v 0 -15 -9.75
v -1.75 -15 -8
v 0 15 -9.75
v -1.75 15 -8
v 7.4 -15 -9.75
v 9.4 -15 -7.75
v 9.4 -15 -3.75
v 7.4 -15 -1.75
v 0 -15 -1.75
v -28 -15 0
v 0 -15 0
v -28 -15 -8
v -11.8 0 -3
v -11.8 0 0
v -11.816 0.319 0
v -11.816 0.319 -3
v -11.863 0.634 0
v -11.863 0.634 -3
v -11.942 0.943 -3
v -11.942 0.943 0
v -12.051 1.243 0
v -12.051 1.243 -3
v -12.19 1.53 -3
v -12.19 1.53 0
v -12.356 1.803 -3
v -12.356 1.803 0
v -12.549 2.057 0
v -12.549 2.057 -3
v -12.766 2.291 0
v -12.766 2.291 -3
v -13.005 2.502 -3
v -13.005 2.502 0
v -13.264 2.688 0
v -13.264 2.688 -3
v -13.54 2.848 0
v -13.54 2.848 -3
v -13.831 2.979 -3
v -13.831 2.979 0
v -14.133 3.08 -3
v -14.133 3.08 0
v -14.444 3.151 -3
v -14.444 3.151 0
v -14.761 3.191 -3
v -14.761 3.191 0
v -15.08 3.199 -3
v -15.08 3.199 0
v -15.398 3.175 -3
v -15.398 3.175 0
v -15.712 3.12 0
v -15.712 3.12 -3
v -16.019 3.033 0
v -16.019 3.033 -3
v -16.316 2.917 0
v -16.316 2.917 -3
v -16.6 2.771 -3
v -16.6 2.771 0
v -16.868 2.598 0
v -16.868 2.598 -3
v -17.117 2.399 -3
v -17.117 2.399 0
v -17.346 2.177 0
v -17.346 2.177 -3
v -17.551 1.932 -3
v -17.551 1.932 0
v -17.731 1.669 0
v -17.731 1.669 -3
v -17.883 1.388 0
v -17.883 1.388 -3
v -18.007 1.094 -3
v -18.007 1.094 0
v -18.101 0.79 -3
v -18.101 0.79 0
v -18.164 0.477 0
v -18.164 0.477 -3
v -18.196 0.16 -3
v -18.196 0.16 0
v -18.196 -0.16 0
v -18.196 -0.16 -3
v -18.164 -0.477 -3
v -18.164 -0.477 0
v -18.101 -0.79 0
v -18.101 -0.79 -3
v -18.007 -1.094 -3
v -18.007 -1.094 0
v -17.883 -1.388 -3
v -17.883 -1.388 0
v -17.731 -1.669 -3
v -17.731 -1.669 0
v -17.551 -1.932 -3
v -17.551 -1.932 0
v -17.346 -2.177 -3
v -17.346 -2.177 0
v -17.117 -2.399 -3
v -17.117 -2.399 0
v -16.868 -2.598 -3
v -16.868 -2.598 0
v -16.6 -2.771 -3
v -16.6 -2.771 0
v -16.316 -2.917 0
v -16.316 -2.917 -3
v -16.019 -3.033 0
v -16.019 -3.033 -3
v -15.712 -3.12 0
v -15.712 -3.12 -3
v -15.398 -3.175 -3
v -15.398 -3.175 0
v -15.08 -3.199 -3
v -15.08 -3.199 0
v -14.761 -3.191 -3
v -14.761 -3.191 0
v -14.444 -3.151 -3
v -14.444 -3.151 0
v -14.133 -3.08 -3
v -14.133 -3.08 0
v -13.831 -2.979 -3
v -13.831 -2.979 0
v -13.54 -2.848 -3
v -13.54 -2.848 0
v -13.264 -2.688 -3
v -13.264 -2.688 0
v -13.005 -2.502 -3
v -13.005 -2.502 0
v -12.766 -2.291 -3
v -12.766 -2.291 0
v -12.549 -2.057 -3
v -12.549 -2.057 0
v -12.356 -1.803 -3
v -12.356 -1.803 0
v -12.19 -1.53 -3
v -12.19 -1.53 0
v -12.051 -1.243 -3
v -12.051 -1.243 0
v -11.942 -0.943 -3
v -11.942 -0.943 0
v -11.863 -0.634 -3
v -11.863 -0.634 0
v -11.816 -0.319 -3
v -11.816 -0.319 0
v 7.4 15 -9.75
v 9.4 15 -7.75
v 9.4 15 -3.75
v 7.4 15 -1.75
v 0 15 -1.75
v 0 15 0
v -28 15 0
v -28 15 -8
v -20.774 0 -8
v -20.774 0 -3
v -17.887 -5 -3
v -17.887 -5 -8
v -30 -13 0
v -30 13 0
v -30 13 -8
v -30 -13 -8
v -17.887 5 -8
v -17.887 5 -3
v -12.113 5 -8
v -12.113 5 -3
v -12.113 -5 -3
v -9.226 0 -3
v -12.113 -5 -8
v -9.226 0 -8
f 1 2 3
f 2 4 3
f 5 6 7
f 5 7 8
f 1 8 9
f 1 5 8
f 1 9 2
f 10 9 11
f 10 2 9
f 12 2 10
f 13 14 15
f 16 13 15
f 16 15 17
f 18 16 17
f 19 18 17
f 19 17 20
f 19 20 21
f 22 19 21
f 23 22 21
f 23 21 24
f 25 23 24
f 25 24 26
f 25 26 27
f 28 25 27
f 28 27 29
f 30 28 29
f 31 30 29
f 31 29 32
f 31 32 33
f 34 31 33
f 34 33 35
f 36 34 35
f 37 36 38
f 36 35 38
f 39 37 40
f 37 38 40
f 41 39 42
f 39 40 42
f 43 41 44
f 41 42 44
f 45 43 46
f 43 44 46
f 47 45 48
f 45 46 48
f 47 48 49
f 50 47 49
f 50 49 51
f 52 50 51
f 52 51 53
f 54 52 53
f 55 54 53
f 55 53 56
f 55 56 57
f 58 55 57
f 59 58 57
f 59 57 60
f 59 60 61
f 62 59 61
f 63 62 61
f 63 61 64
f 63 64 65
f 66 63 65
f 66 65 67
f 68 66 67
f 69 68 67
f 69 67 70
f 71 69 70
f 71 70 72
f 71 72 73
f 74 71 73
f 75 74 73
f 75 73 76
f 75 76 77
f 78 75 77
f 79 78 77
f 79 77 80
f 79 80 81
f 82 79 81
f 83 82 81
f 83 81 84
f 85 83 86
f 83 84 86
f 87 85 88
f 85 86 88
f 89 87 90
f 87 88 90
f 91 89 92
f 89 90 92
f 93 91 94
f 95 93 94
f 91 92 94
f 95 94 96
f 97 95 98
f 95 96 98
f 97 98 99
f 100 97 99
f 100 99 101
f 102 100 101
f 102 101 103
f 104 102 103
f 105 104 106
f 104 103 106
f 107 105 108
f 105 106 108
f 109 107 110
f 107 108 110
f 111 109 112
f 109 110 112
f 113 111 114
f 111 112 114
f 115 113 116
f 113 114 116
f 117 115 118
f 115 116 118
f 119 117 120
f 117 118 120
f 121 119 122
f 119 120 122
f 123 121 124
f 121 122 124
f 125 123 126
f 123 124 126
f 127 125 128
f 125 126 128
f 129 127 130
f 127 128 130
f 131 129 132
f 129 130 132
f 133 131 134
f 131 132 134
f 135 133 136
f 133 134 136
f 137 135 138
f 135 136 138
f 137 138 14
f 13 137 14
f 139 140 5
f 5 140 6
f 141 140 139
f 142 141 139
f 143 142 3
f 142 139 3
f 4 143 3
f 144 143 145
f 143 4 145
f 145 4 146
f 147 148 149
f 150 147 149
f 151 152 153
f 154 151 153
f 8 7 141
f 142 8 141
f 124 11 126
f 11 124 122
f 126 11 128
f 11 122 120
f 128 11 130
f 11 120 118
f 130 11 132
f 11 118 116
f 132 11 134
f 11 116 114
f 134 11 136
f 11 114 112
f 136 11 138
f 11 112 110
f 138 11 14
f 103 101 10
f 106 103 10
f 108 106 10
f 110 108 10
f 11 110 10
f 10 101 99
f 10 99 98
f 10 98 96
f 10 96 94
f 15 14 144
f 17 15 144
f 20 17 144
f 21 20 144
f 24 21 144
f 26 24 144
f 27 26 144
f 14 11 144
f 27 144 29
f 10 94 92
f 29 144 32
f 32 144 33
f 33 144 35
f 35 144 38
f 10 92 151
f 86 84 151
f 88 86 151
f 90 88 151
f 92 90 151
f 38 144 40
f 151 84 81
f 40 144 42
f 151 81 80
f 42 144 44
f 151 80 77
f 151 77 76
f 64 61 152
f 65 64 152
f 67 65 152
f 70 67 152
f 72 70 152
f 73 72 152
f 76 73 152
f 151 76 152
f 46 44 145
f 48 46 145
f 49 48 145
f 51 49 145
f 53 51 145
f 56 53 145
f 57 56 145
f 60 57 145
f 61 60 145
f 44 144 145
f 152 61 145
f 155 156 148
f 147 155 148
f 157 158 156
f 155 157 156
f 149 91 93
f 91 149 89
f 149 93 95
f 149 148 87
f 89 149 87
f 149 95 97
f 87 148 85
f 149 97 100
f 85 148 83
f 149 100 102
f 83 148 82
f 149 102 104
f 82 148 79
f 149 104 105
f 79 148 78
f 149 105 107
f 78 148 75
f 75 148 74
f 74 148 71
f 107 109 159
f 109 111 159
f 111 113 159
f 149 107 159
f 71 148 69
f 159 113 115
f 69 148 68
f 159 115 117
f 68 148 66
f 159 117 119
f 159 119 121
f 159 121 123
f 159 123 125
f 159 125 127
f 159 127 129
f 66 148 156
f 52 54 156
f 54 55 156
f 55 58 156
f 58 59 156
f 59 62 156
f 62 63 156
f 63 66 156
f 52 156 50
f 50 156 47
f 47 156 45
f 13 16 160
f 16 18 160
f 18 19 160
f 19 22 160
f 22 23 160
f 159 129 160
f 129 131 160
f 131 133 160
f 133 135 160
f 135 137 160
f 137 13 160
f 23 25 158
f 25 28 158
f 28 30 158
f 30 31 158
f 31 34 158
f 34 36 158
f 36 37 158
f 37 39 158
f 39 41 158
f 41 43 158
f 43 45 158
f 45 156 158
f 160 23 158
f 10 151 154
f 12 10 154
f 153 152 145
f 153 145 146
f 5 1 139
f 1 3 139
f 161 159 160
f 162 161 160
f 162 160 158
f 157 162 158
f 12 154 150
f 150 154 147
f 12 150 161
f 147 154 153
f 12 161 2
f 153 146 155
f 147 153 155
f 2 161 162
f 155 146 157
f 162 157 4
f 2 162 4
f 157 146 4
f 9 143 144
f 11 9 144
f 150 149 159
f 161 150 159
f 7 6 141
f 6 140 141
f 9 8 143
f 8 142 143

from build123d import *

# Parameters (mm, degrees)
SALIENTE_EXTRUIR1_DEPTH = 15
CROQUIS2_R              = 3.2
CORTAR_EXTRUIR1_DEPTH   = 10.75
CORTAR_EXTRUIR2_START   = -3
CORTAR_EXTRUIR2_DEPTH   = 7.75
CHAFL_N1_SIZE           = 2


with BuildPart() as part:
    # Croquis1 → Saliente-Extruir1 (new body, symmetric)
    with BuildSketch(Plane(origin=(0, 0, 0), x_dir=(1, 0, 0), z_dir=(0, 1, 0))):
        Polygon((0, 0), (-30, 0), (-30, 8), (-1.75, 8), (0, 9.75), (9.4, 9.75), (9.4, 1.75), (0, 1.75), align=None)
    extrude(amount=SALIENTE_EXTRUIR1_DEPTH, both=True)

    # Croquis2 → Cortar-Extruir1 (cut, through all)
    with BuildSketch(Plane.XY):
        with Locations((-15, 0)):
            Circle(CROQUIS2_R)
    extrude(amount=-CORTAR_EXTRUIR1_DEPTH, mode=Mode.SUBTRACT)

    # Croquis3 → Cortar-Extruir2 (cut, through all)
    with BuildSketch(Plane.XY.offset(CORTAR_EXTRUIR2_START)):
        Polygon((-9.226497308, 0), (-12.113248654, 5), (-17.886751346, 5), (-20.773502692, 0), (-17.886751346, -5), (-12.113248654, -5), align=None)
    extrude(amount=-CORTAR_EXTRUIR2_DEPTH, mode=Mode.SUBTRACT)

    # Chaflán1
    chafl_n1_edges = [part.edges().sort_by_distance(p)[0] for p in [
        (9.4, 0, -9.75),
        (9.4, 0, -1.75),
        (-30, 15, -4),
        (-30, -15, -4),
    ]]
    chamfer(chafl_n1_edges, length=CHAFL_N1_SIZE)


solid = part.part
